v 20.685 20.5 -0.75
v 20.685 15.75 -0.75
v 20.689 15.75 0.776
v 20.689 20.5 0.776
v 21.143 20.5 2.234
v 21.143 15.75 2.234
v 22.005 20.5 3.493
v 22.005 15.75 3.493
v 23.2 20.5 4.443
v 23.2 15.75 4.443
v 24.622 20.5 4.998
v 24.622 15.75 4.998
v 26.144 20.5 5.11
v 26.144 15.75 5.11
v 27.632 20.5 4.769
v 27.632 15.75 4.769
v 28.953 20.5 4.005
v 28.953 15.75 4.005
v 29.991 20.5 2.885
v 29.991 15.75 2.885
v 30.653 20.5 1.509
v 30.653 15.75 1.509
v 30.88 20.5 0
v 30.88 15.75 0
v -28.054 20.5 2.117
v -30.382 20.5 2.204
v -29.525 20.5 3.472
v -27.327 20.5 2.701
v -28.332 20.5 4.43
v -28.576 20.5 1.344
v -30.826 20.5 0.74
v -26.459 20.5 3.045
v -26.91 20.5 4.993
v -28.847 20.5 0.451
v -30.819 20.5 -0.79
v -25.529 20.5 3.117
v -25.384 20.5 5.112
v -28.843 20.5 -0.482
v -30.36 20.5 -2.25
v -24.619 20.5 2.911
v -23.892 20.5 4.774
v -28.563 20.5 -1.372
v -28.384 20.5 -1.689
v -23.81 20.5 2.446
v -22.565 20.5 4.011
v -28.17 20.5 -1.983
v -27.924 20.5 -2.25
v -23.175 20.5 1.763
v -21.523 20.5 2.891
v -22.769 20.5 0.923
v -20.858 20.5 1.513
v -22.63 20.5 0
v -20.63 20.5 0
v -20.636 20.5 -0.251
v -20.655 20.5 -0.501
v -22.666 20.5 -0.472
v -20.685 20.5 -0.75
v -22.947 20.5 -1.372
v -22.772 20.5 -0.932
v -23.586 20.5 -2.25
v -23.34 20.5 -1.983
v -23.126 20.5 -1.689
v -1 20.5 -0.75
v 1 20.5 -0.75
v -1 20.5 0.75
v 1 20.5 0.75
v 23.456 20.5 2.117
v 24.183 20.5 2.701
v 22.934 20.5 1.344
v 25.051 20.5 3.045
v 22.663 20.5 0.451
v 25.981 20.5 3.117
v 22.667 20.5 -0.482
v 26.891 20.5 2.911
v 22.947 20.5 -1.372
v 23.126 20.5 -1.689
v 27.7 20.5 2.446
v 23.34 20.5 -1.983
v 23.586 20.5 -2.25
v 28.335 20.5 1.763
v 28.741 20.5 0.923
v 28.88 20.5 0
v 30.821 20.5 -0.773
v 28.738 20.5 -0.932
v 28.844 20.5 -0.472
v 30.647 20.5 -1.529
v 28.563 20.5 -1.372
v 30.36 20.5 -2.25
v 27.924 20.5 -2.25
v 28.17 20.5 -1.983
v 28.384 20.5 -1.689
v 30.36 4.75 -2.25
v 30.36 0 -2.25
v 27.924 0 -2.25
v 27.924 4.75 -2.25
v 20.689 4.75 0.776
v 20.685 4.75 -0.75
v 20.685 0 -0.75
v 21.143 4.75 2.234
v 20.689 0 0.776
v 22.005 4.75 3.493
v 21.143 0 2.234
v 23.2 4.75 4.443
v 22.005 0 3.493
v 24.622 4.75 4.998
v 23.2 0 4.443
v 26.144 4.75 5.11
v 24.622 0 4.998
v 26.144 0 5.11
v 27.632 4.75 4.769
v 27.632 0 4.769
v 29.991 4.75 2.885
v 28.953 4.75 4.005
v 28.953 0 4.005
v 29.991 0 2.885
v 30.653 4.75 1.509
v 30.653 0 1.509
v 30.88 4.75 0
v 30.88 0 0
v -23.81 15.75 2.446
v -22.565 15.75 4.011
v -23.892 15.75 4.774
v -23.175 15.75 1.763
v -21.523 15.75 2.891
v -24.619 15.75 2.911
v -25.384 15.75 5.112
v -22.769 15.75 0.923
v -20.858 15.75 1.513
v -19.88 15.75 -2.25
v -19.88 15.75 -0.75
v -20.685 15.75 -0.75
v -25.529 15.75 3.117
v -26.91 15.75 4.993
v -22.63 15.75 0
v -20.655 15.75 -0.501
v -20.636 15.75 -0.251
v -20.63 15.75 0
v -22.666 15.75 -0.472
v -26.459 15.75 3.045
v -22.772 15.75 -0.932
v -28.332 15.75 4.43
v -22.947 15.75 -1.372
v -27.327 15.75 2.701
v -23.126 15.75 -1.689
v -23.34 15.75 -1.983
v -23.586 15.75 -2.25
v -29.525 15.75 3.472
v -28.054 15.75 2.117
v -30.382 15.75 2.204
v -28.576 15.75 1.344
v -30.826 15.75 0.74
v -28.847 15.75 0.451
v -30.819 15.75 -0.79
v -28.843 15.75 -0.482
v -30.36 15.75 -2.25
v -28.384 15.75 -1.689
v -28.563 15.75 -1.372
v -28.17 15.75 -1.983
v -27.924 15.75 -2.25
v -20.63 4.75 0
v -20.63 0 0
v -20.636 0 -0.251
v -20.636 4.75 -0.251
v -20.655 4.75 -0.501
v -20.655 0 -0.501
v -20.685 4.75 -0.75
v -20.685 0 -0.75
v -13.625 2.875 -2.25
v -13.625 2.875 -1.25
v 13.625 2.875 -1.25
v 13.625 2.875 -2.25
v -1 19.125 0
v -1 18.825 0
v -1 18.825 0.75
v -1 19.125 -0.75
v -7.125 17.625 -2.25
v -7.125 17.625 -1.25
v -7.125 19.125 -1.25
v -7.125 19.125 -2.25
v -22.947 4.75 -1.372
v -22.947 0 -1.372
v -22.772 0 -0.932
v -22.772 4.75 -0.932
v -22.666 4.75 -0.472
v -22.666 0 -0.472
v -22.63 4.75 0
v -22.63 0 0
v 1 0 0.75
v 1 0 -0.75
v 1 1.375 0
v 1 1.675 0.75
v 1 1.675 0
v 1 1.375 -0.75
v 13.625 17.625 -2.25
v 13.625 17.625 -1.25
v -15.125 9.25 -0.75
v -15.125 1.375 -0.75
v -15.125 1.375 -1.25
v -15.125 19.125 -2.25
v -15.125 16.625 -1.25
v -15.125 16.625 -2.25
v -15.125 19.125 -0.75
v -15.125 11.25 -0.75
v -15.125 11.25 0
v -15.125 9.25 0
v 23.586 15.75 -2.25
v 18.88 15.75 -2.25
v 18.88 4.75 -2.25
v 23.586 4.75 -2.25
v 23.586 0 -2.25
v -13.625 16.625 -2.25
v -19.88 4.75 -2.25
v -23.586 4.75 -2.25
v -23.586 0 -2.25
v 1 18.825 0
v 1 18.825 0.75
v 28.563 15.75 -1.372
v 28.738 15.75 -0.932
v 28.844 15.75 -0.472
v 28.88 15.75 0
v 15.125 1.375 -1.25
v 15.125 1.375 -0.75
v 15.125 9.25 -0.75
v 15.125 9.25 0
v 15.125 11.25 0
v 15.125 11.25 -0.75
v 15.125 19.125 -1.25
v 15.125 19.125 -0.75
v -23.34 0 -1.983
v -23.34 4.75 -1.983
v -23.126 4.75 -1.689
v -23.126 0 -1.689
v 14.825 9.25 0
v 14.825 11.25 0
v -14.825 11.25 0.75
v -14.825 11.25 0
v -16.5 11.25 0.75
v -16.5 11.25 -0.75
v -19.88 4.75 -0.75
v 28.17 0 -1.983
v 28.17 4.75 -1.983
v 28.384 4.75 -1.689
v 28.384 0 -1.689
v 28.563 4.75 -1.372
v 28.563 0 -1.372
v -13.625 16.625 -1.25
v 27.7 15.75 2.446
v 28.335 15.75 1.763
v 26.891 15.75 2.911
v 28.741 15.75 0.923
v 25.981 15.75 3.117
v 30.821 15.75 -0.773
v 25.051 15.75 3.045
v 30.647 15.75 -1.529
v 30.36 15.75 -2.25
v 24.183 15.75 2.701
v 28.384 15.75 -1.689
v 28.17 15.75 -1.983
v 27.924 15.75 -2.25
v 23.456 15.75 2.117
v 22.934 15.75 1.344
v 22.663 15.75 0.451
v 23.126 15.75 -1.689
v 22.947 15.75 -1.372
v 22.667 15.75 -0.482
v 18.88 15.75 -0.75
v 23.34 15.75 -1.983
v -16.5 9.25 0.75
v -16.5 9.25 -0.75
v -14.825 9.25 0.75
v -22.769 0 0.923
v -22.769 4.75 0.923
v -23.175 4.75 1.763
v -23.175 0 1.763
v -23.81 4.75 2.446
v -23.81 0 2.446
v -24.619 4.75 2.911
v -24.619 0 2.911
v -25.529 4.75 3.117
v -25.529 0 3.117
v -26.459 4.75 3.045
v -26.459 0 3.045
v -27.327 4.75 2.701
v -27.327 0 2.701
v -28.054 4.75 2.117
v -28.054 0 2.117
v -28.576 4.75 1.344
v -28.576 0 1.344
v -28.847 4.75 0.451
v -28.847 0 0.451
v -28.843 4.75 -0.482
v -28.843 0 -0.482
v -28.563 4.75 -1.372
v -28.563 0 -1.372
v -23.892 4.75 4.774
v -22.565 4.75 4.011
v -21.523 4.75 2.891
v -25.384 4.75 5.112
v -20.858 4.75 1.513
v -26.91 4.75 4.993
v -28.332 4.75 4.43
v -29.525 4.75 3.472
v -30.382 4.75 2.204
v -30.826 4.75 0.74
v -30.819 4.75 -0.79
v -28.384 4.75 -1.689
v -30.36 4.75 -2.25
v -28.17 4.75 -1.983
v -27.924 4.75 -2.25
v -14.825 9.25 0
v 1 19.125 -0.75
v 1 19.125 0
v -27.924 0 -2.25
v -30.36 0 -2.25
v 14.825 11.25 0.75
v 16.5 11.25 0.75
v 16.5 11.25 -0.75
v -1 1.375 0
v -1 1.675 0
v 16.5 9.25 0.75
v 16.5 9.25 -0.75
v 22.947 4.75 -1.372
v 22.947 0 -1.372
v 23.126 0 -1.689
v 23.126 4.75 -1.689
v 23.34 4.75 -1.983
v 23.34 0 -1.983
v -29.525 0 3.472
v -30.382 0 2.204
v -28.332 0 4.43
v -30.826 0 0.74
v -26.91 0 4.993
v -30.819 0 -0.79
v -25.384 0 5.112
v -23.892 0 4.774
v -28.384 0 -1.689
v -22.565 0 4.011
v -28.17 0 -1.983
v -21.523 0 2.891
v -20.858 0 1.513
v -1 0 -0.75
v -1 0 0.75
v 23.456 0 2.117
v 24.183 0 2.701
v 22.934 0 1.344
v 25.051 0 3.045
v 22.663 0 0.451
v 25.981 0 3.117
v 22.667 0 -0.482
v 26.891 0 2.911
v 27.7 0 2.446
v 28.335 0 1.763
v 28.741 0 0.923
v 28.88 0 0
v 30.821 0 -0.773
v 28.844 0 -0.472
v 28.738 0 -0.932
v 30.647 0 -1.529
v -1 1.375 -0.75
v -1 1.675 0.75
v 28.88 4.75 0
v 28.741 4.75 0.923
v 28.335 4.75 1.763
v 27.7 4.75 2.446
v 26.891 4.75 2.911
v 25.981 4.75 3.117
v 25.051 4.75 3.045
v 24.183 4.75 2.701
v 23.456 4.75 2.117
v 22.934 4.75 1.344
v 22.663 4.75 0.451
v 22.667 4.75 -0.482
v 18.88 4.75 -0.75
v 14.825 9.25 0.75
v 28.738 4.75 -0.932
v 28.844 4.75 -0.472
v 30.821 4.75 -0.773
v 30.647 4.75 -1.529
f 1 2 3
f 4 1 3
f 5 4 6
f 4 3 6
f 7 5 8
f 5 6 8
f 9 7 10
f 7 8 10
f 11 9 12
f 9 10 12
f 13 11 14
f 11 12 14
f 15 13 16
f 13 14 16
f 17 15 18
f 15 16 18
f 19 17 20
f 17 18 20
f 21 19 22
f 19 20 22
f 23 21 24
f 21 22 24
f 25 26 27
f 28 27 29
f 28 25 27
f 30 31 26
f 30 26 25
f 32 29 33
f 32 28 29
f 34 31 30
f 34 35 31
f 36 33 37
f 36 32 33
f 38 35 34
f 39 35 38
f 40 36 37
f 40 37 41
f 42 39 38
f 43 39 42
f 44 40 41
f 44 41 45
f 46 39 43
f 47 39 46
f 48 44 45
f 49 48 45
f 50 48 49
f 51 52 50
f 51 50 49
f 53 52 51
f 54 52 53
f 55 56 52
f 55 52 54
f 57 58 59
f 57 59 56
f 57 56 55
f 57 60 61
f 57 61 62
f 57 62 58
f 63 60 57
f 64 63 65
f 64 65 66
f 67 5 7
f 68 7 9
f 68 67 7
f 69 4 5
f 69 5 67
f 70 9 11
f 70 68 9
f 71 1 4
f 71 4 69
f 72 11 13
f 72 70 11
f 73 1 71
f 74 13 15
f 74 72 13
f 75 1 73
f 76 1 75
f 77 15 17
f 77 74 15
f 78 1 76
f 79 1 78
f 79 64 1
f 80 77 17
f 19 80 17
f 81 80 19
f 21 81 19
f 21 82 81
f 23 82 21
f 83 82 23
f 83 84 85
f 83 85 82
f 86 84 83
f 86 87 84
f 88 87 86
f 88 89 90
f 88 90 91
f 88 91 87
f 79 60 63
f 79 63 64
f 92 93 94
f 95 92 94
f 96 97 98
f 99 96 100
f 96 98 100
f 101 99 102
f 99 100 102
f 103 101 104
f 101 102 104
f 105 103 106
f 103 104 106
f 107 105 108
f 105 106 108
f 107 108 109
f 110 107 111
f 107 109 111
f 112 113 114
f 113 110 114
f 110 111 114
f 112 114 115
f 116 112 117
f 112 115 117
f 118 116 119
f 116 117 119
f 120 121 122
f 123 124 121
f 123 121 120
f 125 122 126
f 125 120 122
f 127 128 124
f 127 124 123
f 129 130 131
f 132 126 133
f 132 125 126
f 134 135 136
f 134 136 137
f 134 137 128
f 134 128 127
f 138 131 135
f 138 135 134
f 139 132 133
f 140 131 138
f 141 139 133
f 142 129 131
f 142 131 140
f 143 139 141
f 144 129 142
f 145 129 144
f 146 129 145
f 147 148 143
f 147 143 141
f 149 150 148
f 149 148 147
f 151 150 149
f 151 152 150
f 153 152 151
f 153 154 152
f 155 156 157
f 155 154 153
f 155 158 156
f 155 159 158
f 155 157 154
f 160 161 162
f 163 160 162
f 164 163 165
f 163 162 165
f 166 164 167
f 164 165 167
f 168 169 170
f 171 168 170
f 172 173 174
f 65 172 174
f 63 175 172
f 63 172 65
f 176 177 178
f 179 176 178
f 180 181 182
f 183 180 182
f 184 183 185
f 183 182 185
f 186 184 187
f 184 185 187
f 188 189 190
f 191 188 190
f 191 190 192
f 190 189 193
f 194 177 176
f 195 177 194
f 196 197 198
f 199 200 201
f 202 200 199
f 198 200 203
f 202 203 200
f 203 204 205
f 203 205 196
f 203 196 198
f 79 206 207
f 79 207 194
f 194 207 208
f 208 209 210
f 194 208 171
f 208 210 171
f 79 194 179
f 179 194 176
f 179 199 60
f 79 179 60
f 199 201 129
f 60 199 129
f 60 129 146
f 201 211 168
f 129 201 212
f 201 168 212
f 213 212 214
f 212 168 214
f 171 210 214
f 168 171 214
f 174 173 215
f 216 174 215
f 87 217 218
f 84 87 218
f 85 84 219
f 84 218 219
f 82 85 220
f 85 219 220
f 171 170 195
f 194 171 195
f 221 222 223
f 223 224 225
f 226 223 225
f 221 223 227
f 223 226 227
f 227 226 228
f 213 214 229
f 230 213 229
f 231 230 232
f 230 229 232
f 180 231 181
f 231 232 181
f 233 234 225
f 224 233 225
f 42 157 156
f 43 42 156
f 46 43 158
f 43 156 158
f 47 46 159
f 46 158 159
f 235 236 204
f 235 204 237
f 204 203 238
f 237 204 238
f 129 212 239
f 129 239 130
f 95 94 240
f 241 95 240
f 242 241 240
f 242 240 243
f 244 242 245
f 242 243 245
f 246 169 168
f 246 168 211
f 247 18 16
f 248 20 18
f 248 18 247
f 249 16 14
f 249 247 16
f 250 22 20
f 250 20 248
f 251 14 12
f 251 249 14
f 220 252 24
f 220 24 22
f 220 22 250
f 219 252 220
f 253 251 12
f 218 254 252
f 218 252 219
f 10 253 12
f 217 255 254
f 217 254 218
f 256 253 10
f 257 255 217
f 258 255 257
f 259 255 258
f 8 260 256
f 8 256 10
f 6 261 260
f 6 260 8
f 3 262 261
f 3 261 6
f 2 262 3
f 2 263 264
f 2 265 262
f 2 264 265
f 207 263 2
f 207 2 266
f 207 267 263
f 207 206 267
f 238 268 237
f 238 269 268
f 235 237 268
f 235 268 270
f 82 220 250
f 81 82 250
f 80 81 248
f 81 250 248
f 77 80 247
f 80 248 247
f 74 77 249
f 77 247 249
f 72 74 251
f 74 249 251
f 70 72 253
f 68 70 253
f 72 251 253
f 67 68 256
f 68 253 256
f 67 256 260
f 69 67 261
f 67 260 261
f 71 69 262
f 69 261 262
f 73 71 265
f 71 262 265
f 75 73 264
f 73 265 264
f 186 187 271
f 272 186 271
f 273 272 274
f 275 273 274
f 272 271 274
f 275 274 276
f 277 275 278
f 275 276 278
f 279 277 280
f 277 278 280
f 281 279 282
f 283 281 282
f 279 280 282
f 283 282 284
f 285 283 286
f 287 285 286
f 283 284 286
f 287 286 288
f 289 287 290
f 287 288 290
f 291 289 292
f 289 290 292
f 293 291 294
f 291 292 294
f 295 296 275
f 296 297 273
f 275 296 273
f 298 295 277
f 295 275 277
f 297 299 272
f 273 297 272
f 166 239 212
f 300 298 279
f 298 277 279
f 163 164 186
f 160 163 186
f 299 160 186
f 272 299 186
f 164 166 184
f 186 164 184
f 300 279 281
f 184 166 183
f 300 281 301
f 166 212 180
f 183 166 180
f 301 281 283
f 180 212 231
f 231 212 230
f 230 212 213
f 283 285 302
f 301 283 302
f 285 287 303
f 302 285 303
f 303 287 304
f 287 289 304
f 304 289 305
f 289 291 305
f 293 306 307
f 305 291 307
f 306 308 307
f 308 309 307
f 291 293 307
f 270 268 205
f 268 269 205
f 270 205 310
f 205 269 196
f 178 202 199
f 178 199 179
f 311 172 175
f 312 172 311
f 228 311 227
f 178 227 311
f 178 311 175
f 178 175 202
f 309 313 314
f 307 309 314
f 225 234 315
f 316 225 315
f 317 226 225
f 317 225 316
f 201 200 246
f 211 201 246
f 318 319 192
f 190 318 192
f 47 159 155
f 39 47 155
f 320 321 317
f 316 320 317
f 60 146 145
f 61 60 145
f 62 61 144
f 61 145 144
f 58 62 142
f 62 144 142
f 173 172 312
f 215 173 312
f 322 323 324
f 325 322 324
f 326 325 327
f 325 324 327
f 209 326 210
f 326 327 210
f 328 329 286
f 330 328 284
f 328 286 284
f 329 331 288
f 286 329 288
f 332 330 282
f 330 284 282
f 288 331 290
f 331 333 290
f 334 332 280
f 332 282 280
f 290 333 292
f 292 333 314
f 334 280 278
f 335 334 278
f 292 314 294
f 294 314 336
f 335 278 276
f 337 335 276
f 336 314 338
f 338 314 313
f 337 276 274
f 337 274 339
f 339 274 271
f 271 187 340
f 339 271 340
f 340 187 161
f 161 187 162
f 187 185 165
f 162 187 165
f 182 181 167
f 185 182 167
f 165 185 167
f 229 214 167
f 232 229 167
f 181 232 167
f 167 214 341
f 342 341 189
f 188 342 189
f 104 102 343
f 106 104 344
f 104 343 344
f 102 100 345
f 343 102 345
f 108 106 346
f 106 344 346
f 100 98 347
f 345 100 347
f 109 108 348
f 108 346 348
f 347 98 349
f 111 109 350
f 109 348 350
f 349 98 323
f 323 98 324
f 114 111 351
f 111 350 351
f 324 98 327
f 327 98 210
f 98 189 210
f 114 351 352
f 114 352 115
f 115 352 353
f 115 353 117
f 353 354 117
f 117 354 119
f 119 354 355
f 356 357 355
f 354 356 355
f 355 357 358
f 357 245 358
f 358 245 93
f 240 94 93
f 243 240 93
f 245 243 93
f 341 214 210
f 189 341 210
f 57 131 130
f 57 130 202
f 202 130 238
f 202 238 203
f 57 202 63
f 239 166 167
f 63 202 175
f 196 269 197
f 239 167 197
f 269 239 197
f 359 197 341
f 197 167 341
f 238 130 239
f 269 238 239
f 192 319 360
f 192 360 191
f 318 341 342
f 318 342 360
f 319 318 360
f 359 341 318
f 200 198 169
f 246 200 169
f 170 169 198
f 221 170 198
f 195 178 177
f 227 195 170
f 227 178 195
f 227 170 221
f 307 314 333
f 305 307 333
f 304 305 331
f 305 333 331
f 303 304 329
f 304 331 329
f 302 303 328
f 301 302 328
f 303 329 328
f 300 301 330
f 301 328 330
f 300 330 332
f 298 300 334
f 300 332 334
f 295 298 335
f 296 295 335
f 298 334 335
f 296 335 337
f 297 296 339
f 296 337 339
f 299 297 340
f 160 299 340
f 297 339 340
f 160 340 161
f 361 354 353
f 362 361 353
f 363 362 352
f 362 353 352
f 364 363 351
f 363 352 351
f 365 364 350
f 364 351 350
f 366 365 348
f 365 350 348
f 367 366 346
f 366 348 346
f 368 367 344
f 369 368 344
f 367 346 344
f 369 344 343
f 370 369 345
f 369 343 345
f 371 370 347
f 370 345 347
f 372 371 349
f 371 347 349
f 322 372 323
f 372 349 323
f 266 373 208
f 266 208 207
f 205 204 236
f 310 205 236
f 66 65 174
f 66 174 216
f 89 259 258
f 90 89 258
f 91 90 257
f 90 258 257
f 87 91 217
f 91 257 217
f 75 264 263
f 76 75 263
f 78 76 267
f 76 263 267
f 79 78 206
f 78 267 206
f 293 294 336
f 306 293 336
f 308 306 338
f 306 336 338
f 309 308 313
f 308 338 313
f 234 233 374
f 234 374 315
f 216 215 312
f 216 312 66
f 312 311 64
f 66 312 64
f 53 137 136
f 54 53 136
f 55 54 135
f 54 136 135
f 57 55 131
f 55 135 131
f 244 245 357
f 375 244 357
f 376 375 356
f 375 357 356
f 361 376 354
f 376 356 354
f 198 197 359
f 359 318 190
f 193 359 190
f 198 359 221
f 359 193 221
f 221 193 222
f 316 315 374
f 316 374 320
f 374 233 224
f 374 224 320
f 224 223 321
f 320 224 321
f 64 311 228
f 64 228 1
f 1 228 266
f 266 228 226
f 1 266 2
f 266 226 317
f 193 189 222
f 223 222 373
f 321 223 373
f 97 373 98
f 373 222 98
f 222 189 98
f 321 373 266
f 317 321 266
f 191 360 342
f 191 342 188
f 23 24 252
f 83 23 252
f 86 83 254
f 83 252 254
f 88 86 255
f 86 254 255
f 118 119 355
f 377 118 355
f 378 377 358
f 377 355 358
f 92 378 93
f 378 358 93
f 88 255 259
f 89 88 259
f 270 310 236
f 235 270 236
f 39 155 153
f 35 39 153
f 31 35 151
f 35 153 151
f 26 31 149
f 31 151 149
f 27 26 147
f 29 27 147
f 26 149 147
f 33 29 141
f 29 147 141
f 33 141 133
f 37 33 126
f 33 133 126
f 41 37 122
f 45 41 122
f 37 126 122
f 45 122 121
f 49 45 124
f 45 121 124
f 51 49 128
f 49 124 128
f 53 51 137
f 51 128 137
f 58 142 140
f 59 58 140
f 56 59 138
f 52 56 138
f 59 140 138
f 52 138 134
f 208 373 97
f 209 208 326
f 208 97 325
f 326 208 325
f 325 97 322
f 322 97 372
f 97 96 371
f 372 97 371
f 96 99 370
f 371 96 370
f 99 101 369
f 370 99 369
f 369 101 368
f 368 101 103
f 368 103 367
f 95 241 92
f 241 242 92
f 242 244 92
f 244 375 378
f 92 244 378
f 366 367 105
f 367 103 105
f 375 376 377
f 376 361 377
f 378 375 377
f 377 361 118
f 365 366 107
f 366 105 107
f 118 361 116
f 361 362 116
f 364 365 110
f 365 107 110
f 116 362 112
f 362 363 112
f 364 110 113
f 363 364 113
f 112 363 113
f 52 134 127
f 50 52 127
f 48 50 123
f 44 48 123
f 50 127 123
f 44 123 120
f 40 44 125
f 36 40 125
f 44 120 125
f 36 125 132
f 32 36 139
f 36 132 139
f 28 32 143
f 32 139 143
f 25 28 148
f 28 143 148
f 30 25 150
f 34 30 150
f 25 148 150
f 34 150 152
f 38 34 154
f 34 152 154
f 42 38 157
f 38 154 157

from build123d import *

# Parameters (mm, degrees)
BOSS_EXTRUDE1_DEPTH = 20.5
SKETCH2_W           = 11
SKETCH2_H           = 11
CUT_EXTRUDE1_DEPTH  = 38.791732231
SKETCH3_W           = 30.25
SKETCH3_H           = 17.75
CUT_EXTRUDE2_DEPTH  = 0.5
CUT_EXTRUDE3_REACH  = 39.609
SKETCH4_W           = 27.25
SKETCH4_H           = 14.75
SKETCH5_W           = 2
SKETCH5_H           = 1.375
SKETCH5_W_2         = 1.375
SKETCH5_H_2         = 2
BOSS_EXTRUDE2_DEPTH = 0.75
SKETCH6_W           = 1.375
SKETCH6_H           = 2
SKETCH6_W_2         = 0.3
SKETCH6_W_3         = 2
SKETCH6_H_2         = 0.3
SKETCH6_H_3         = 1.375
BOSS_EXTRUDE3_DEPTH = 0.75
SKETCH7_W           = 8
SKETCH7_H           = 2.5
CUT_EXTRUDE4_DEPTH  = 38.609374164
CUT_EXTRUDE5_REACH  = 39.528
SKETCH8_W           = 1
SKETCH8_H           = 11


with BuildPart() as part:
    # Sketch1 → Boss-Extrude1 (new body)
    with BuildSketch(Plane(origin=(0, 0, 0), x_dir=(1, 0, 0), z_dir=(0, 1, 0))):
        with BuildLine():
            Line((-21.150314886, 2.25), (-22.947265174, 1.37195122))
            ThreePointArc((-22.947265174, 1.37195122), (-22.710349254, 0.704078714), (-22.63, 0))
            ThreePointArc((-22.63, 0), (-26.459078714, -3.044650746), (-28.562734826, 1.37195122))
            Line((-28.562734826, 1.37195122), (-30.359685114, 2.25))
            ThreePointArc((-30.359685114, 2.25), (-26.90968909, -4.993227223), (-20.63, 0))
            ThreePointArc((-20.63, 0), (-20.643812376, 0.376013393), (-20.685175052, 0.75))
            ThreePointArc((-20.685175052, 0.75), (-20.85994778, 1.517922517), (-21.150314886, 2.25))
        make_face()
        with BuildLine():
            Line((21.150314886, 2.25), (-21.150314886, 2.25))
            ThreePointArc((-21.150314886, 2.25), (-20.85994778, 1.517922517), (-20.685175052, 0.75))
            Line((-20.685175052, 0.75), (20.685175052, 0.75))
            ThreePointArc((20.685175052, 0.75), (20.85994778, 1.517922517), (21.150314886, 2.25))
        make_face()
        with BuildLine():
            Line((22.947265174, 1.37195122), (21.150314886, 2.25))
            ThreePointArc((21.150314886, 2.25), (20.85994778, 1.517922517), (20.685175052, 0.75))
            ThreePointArc((20.685175052, 0.75), (25.378986607, -5.111187624), (30.88, 0))
            ThreePointArc((30.88, 0), (30.748227223, 1.15468909), (30.359685114, 2.25))
            Line((30.359685114, 2.25), (28.562734826, 1.37195122))
            ThreePointArc((28.562734826, 1.37195122), (28.799650746, 0.704078714), (28.88, 0))
            ThreePointArc((28.88, 0), (25.050921286, -3.044650746), (22.947265174, 1.37195122))
        make_face()
        with BuildLine():
            Line((23.586331053, 2.25), (21.150314886, 2.25))
            Line((21.150314886, 2.25), (22.947265174, 1.37195122))
            ThreePointArc((22.947265174, 1.37195122), (23.22836369, 1.838949145), (23.586331053, 2.25))
        make_face()
        with BuildLine():
            Line((28.562734826, 1.37195122), (30.359685114, 2.25))
            Line((30.359685114, 2.25), (27.923668947, 2.25))
            ThreePointArc((27.923668947, 2.25), (28.28163631, 1.838949145), (28.562734826, 1.37195122))
        make_face()
        with BuildLine():
            ThreePointArc((-23.586331053, 2.25), (-23.22836369, 1.838949145), (-22.947265174, 1.37195122))
            Line((-22.947265174, 1.37195122), (-21.150314886, 2.25))
            Line((-21.150314886, 2.25), (-23.586331053, 2.25))
        make_face()
        with BuildLine():
            Line((-30.359685114, 2.25), (-28.562734826, 1.37195122))
            ThreePointArc((-28.562734826, 1.37195122), (-28.28163631, 1.838949145), (-27.923668947, 2.25))
            Line((-27.923668947, 2.25), (-30.359685114, 2.25))
        make_face()
    extrude(amount=BOSS_EXTRUDE1_DEPTH)

    # Sketch2 → Cut-Extrude1 (cut, through all)
    with BuildSketch(Plane(origin=(0, 0, -2.25), x_dir=(-1, 0, 0), z_dir=(0, 0, -1))):
        with Locations((-25.38, 10.25)):
            Rectangle(SKETCH2_W, SKETCH2_H)
        with Locations((25.38, 10.25)):
            Rectangle(SKETCH2_W, SKETCH2_H)
    extrude(amount=-CUT_EXTRUDE1_DEPTH, mode=Mode.SUBTRACT)

    # Sketch3 → Cut-Extrude2 (cut)
    with BuildSketch(Plane.XY.offset(-0.75)):
        with Locations((0, 10.25)):
            Rectangle(SKETCH3_W, SKETCH3_H)
    extrude(amount=-CUT_EXTRUDE2_DEPTH, mode=Mode.SUBTRACT)

    # Sketch4 → Cut-Extrude3 (cut, up to next)
    with BuildSketch(Plane.XY.offset(-1.25), mode=Mode.PRIVATE) as cut_extrude3_sk1:
        with Locations((0, 10.25)):
            Rectangle(SKETCH4_W, SKETCH4_H)
    cut_extrude3_tool1 = extrude(cut_extrude3_sk1.sketch, amount=-CUT_EXTRUDE3_REACH, mode=Mode.PRIVATE) & part.part
    add(cut_extrude3_tool1.solids().sort_by_distance((0, 10.25, -1.25))[0], mode=Mode.SUBTRACT)

    # Sketch5 → Boss-Extrude2 (add)
    with BuildSketch(Plane.XY.offset(-0.75)):
        with Locations((0, 19.8125)):
            Rectangle(SKETCH5_W, SKETCH5_H)
        with Locations((0, 0.6875)):
            Rectangle(SKETCH5_W, SKETCH5_H)
        with Locations((-15.8125, 10.25)):
            Rectangle(SKETCH5_W_2, SKETCH5_H_2)
        with Locations((15.8125, 10.25)):
            Rectangle(SKETCH5_W_2, SKETCH5_H_2)
    extrude(amount=BOSS_EXTRUDE2_DEPTH)

    # Sketch6 → Boss-Extrude3 (add)
    with BuildSketch(Plane.XY):
        with Locations((-15.8125, 10.25)):
            Rectangle(SKETCH6_W, SKETCH6_H)
        with Locations((-14.975, 10.25)):
            Rectangle(SKETCH6_W_2, SKETCH6_H)
        with Locations((0, 1.525)):
            Rectangle(SKETCH6_W_3, SKETCH6_H_2)
        with Locations((0, 0.6875)):
            Rectangle(SKETCH6_W_3, SKETCH6_H_3)
        with Locations((14.975, 10.25)):
            Rectangle(SKETCH6_W_2, SKETCH6_H)
        with Locations((15.8125, 10.25)):
            Rectangle(SKETCH6_W, SKETCH6_H)
        with Locations((0, 19.8125)):
            Rectangle(SKETCH6_W_3, SKETCH6_H_3)
        with Locations((0, 18.975)):
            Rectangle(SKETCH6_W_3, SKETCH6_H_2)
    extrude(amount=BOSS_EXTRUDE3_DEPTH)

    # Sketch7 → Cut-Extrude4 (cut, through all)
    with BuildSketch(Plane.XY.offset(-1.25)):
        with Locations((-11.125, 17.875)):
            Rectangle(SKETCH7_W, SKETCH7_H)
    extrude(amount=-CUT_EXTRUDE4_DEPTH, mode=Mode.SUBTRACT)

    # Sketch8 → Cut-Extrude5 (cut, up to next)
    with BuildSketch(Plane.XY.offset(-0.75), mode=Mode.PRIVATE) as cut_extrude5_sk1:
        with Locations((19.38, 10.25)):
            Rectangle(SKETCH8_W, SKETCH8_H)
    cut_extrude5_tool1 = extrude(cut_extrude5_sk1.sketch, amount=-CUT_EXTRUDE5_REACH, mode=Mode.PRIVATE) & part.part
    add(cut_extrude5_tool1.solids().sort_by_distance((19.38, 10.25, -0.75))[0], mode=Mode.SUBTRACT)


solid = part.part
